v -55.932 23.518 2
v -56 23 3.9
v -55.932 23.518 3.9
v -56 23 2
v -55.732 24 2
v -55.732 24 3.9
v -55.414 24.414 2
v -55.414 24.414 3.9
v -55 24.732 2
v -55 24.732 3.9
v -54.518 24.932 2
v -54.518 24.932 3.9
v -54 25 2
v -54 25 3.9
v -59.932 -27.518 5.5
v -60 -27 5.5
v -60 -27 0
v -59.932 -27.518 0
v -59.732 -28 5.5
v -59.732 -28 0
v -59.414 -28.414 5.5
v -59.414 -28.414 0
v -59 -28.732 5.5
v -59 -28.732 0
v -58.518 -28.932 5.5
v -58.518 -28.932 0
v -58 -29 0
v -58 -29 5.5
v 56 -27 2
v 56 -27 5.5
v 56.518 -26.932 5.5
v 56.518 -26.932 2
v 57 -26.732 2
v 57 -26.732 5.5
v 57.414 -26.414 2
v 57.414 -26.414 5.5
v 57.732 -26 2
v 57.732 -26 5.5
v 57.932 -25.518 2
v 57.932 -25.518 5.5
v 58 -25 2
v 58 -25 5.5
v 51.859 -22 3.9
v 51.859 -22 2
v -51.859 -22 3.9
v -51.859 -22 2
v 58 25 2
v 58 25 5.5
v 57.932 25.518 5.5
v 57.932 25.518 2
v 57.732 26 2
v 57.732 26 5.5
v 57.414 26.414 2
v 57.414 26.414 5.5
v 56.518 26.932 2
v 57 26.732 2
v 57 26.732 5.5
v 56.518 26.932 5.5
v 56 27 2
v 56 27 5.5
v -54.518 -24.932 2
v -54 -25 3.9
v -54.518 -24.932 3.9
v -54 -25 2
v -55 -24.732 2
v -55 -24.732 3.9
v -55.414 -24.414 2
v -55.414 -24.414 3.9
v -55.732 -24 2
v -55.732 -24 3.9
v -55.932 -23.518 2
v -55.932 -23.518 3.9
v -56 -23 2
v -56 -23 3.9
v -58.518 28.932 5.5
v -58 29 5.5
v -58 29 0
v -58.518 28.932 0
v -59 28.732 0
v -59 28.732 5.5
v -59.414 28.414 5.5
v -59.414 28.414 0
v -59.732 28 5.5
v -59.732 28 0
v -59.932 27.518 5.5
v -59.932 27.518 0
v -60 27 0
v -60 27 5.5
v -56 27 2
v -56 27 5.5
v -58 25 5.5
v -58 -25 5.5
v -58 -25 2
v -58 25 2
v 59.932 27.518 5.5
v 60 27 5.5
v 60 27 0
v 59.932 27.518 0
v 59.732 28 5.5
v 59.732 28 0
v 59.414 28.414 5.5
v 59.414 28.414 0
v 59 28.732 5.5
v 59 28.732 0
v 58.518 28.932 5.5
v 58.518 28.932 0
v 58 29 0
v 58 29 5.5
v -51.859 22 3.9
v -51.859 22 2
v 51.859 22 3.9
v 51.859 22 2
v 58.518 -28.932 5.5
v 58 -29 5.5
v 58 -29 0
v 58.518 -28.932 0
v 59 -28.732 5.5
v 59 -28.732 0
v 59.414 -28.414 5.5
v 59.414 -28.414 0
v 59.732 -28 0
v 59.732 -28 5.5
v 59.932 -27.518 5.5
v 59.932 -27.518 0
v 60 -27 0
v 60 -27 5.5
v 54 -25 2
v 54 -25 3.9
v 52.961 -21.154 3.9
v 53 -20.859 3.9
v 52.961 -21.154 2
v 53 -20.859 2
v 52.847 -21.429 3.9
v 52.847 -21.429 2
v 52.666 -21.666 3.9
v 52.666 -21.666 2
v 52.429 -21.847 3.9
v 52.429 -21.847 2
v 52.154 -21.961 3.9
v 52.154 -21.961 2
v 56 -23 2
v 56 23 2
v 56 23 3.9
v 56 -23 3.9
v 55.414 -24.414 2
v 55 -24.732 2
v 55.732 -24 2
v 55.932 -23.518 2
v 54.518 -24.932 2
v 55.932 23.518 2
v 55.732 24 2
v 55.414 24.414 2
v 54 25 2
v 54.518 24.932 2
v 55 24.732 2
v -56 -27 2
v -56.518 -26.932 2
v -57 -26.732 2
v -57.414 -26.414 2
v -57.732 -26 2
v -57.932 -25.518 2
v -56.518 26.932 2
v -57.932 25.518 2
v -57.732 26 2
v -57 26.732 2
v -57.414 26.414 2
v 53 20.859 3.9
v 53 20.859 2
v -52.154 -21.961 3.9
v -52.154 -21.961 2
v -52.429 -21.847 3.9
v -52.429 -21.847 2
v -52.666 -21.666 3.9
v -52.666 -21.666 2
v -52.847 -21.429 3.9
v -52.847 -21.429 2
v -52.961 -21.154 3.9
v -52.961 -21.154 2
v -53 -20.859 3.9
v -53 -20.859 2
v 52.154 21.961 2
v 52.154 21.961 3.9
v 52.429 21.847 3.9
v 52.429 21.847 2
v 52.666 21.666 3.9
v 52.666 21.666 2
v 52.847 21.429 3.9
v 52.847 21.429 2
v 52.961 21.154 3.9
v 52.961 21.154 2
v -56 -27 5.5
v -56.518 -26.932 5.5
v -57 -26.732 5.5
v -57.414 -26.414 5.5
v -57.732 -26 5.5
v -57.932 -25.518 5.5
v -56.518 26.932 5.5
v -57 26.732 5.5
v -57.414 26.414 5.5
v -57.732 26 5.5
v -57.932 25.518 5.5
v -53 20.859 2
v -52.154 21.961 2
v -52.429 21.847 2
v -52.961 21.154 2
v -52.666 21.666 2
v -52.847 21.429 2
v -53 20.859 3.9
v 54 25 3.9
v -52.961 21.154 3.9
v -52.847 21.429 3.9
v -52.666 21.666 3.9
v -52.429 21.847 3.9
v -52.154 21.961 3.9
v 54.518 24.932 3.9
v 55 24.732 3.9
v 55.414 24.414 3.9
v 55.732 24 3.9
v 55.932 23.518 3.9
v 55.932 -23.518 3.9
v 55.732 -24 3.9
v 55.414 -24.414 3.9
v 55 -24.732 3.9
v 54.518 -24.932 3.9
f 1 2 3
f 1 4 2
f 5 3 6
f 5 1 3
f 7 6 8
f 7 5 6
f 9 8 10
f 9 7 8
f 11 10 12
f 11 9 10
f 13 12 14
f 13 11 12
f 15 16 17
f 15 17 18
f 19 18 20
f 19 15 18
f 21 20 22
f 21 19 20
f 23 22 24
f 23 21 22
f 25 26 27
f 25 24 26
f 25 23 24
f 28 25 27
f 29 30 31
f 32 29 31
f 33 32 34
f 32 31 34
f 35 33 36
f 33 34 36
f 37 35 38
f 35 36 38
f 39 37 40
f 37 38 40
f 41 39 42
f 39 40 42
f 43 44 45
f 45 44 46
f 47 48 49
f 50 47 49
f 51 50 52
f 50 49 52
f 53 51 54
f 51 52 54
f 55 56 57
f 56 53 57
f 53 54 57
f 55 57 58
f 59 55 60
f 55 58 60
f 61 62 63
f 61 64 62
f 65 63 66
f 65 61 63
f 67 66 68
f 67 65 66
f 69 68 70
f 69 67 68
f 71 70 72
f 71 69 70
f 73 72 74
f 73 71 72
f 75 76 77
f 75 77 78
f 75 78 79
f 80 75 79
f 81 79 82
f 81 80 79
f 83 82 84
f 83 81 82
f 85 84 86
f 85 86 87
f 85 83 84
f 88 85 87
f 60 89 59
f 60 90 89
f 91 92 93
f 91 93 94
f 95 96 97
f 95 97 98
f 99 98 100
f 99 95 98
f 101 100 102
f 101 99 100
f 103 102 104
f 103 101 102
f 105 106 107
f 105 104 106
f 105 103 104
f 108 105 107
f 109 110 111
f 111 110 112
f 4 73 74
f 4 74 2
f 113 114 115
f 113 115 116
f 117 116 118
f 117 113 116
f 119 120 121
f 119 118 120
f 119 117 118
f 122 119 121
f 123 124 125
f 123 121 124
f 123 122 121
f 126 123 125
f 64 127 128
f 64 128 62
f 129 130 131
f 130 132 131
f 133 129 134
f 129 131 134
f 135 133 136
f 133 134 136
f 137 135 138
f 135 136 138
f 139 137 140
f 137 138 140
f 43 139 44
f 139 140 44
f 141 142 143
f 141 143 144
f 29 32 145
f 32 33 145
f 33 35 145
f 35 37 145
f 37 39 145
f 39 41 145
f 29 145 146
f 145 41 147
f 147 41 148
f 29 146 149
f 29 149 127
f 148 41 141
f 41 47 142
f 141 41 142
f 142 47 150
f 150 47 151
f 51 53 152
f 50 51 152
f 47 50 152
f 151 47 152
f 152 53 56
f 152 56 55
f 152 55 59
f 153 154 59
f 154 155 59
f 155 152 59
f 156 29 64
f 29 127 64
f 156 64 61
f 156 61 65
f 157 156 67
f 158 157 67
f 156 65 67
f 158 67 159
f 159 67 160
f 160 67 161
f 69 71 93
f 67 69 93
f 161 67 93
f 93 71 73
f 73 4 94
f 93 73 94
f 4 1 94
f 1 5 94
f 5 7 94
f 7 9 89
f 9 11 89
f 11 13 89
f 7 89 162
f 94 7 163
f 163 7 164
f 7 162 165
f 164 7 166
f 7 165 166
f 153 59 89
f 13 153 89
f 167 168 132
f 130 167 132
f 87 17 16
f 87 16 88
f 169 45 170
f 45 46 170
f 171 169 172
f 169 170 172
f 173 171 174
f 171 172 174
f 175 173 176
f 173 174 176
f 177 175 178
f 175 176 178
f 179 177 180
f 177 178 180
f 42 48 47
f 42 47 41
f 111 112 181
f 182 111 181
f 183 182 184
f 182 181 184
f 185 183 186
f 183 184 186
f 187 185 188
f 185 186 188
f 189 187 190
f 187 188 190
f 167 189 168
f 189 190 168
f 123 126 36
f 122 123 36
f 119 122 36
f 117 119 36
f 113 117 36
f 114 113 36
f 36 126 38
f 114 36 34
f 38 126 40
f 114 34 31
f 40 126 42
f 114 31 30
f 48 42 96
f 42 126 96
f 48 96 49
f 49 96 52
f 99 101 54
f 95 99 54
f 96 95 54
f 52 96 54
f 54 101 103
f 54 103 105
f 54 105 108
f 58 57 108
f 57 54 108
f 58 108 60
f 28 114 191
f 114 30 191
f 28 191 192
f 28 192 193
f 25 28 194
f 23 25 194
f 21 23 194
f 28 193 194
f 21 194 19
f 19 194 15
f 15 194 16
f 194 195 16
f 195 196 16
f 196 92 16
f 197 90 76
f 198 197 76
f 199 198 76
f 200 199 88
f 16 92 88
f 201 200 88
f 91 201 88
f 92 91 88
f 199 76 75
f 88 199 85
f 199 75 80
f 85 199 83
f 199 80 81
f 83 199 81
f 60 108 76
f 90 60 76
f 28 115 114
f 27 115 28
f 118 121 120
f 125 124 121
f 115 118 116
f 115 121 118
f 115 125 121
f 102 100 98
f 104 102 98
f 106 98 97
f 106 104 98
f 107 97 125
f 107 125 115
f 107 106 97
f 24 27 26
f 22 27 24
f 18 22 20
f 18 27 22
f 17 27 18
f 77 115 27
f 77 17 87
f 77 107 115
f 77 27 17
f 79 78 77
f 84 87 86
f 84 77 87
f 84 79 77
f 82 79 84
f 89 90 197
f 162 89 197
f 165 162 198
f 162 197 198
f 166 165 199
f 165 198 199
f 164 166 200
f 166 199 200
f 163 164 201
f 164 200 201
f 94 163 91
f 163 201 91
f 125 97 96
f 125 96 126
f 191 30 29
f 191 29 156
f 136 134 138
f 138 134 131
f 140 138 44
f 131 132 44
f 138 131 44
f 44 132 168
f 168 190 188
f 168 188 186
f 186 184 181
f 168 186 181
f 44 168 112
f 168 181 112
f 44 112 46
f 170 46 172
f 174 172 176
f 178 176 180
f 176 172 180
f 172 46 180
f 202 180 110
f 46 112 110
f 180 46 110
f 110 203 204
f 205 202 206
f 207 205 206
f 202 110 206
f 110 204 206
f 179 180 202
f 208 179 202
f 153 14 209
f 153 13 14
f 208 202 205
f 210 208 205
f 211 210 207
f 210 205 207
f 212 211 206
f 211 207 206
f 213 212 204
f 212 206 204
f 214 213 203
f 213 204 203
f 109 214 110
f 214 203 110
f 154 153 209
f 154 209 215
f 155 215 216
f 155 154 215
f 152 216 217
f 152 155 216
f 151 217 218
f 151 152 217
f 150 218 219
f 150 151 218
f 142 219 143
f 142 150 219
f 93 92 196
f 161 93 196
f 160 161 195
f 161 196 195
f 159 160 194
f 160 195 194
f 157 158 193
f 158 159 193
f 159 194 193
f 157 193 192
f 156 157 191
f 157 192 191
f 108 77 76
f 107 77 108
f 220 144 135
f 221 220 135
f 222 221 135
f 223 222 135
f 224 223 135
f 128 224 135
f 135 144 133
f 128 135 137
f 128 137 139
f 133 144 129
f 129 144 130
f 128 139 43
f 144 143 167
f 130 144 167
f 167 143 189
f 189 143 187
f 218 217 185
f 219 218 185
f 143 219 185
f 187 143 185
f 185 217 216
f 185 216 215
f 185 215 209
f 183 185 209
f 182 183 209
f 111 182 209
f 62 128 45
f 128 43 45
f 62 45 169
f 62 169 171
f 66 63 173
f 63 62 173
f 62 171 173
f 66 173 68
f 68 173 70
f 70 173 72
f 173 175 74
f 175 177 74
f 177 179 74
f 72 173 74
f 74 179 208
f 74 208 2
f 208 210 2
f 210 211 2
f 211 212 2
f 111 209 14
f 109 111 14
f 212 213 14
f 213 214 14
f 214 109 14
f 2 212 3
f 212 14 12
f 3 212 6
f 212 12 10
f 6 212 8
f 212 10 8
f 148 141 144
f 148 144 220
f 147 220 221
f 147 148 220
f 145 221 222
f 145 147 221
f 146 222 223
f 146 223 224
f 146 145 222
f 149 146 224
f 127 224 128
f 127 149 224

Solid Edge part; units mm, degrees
sketch "Sketch1" plane through (0, 0, 0) normal (0, 0, 1) x (1, 0, 0)
  line L0 (-60, 29) -> (60, 29)
  line L1 (60, 29) -> (60, -29)
  line L2 (60, -29) -> (-60, -29)
  line L3 (-60, -29) -> (-60, 29)
  dimension "D1" = 120
  dimension "D2" = 58
extrude "Protrusion1" add sketch "Sketch1" along normal blind 5.5
fillet "Redondo_1" radius 2 4 edges at (60, 29, 2.75) (60, -29, 2.75) (-60, 29, 2.75) (-60, -29, 2.75)
sketch "Sketch2" plane through (0, 0, 5.5) normal (0, 0, 1) x (1, 0, 0)
  line L0 (-56, 27) -> (56, 27)
  arc A0 (56, 27) -> (58, 25) centre (56, 25) cw
  line L1 (58, 25) -> (58, -25)
  arc A1 (56, -27) -> (58, -25) centre (56, -25) ccw
  line L2 (56, -27) -> (-56, -27)
  arc A2 (-56, -27) -> (-58, -25) centre (-56, -25) cw
  line L3 (-58, -25) -> (-58, 25)
  arc A3 (-56, 27) -> (-58, 25) centre (-56, 25) ccw
  dimension "D1" = 2
  dimension "D2" = 2
  dimension "D3" = 2
extrude "Recorte_Extrudado_1" cut sketch "Sketch2" against normal blind 3.5
sketch "Sketch3" plane through (0, 0, 2) normal (0, 0, 1) x (1, 0, 0)
  line L0 (-54, 25) -> (54, 25)
  arc A0 (54, 25) -> (56, 23) centre (54, 23) cw
  line L1 (56, 23) -> (56, -23)
  arc A1 (56, -23) -> (54, -25) centre (54, -23) cw
  line L2 (54, -25) -> (-54, -25)
  arc A2 (-56, -23) -> (-54, -25) centre (-54, -23) ccw
  line L3 (-56, -23) -> (-56, 23)
  arc A3 (-56, 23) -> (-54, 25) centre (-54, 23) cw
  line L4 (-51.8587, 22) -> (51.8587, 22)
  arc A4 (53, 20.8587) -> (51.8587, 22) centre (51.8587, 20.8587) ccw
  line L5 (53, 20.8587) -> (53, -20.8587)
  arc A5 (51.8587, -22) -> (53, -20.8587) centre (51.8587, -20.8587) ccw
  line L6 (51.8587, -22) -> (-51.8587, -22)
  arc A6 (-51.8587, -22) -> (-53, -20.8587) centre (-51.8587, -20.8587) cw
  line L7 (-53, -20.8587) -> (-53, 20.8587)
  arc A7 (-53, 20.8587) -> (-51.8587, 22) centre (-51.8587, 20.8587) cw
  dimension "D1" = 2
  dimension "D2" = 2
  dimension "D3" = 2
  dimension "D4" = 3
  dimension "D5" = 3
  dimension "D6" = 3
  dimension "D7" = 48
  dimension "D8" = 3
extrude "Protrusion2" add sketch "Sketch3" along normal blind 1.9
